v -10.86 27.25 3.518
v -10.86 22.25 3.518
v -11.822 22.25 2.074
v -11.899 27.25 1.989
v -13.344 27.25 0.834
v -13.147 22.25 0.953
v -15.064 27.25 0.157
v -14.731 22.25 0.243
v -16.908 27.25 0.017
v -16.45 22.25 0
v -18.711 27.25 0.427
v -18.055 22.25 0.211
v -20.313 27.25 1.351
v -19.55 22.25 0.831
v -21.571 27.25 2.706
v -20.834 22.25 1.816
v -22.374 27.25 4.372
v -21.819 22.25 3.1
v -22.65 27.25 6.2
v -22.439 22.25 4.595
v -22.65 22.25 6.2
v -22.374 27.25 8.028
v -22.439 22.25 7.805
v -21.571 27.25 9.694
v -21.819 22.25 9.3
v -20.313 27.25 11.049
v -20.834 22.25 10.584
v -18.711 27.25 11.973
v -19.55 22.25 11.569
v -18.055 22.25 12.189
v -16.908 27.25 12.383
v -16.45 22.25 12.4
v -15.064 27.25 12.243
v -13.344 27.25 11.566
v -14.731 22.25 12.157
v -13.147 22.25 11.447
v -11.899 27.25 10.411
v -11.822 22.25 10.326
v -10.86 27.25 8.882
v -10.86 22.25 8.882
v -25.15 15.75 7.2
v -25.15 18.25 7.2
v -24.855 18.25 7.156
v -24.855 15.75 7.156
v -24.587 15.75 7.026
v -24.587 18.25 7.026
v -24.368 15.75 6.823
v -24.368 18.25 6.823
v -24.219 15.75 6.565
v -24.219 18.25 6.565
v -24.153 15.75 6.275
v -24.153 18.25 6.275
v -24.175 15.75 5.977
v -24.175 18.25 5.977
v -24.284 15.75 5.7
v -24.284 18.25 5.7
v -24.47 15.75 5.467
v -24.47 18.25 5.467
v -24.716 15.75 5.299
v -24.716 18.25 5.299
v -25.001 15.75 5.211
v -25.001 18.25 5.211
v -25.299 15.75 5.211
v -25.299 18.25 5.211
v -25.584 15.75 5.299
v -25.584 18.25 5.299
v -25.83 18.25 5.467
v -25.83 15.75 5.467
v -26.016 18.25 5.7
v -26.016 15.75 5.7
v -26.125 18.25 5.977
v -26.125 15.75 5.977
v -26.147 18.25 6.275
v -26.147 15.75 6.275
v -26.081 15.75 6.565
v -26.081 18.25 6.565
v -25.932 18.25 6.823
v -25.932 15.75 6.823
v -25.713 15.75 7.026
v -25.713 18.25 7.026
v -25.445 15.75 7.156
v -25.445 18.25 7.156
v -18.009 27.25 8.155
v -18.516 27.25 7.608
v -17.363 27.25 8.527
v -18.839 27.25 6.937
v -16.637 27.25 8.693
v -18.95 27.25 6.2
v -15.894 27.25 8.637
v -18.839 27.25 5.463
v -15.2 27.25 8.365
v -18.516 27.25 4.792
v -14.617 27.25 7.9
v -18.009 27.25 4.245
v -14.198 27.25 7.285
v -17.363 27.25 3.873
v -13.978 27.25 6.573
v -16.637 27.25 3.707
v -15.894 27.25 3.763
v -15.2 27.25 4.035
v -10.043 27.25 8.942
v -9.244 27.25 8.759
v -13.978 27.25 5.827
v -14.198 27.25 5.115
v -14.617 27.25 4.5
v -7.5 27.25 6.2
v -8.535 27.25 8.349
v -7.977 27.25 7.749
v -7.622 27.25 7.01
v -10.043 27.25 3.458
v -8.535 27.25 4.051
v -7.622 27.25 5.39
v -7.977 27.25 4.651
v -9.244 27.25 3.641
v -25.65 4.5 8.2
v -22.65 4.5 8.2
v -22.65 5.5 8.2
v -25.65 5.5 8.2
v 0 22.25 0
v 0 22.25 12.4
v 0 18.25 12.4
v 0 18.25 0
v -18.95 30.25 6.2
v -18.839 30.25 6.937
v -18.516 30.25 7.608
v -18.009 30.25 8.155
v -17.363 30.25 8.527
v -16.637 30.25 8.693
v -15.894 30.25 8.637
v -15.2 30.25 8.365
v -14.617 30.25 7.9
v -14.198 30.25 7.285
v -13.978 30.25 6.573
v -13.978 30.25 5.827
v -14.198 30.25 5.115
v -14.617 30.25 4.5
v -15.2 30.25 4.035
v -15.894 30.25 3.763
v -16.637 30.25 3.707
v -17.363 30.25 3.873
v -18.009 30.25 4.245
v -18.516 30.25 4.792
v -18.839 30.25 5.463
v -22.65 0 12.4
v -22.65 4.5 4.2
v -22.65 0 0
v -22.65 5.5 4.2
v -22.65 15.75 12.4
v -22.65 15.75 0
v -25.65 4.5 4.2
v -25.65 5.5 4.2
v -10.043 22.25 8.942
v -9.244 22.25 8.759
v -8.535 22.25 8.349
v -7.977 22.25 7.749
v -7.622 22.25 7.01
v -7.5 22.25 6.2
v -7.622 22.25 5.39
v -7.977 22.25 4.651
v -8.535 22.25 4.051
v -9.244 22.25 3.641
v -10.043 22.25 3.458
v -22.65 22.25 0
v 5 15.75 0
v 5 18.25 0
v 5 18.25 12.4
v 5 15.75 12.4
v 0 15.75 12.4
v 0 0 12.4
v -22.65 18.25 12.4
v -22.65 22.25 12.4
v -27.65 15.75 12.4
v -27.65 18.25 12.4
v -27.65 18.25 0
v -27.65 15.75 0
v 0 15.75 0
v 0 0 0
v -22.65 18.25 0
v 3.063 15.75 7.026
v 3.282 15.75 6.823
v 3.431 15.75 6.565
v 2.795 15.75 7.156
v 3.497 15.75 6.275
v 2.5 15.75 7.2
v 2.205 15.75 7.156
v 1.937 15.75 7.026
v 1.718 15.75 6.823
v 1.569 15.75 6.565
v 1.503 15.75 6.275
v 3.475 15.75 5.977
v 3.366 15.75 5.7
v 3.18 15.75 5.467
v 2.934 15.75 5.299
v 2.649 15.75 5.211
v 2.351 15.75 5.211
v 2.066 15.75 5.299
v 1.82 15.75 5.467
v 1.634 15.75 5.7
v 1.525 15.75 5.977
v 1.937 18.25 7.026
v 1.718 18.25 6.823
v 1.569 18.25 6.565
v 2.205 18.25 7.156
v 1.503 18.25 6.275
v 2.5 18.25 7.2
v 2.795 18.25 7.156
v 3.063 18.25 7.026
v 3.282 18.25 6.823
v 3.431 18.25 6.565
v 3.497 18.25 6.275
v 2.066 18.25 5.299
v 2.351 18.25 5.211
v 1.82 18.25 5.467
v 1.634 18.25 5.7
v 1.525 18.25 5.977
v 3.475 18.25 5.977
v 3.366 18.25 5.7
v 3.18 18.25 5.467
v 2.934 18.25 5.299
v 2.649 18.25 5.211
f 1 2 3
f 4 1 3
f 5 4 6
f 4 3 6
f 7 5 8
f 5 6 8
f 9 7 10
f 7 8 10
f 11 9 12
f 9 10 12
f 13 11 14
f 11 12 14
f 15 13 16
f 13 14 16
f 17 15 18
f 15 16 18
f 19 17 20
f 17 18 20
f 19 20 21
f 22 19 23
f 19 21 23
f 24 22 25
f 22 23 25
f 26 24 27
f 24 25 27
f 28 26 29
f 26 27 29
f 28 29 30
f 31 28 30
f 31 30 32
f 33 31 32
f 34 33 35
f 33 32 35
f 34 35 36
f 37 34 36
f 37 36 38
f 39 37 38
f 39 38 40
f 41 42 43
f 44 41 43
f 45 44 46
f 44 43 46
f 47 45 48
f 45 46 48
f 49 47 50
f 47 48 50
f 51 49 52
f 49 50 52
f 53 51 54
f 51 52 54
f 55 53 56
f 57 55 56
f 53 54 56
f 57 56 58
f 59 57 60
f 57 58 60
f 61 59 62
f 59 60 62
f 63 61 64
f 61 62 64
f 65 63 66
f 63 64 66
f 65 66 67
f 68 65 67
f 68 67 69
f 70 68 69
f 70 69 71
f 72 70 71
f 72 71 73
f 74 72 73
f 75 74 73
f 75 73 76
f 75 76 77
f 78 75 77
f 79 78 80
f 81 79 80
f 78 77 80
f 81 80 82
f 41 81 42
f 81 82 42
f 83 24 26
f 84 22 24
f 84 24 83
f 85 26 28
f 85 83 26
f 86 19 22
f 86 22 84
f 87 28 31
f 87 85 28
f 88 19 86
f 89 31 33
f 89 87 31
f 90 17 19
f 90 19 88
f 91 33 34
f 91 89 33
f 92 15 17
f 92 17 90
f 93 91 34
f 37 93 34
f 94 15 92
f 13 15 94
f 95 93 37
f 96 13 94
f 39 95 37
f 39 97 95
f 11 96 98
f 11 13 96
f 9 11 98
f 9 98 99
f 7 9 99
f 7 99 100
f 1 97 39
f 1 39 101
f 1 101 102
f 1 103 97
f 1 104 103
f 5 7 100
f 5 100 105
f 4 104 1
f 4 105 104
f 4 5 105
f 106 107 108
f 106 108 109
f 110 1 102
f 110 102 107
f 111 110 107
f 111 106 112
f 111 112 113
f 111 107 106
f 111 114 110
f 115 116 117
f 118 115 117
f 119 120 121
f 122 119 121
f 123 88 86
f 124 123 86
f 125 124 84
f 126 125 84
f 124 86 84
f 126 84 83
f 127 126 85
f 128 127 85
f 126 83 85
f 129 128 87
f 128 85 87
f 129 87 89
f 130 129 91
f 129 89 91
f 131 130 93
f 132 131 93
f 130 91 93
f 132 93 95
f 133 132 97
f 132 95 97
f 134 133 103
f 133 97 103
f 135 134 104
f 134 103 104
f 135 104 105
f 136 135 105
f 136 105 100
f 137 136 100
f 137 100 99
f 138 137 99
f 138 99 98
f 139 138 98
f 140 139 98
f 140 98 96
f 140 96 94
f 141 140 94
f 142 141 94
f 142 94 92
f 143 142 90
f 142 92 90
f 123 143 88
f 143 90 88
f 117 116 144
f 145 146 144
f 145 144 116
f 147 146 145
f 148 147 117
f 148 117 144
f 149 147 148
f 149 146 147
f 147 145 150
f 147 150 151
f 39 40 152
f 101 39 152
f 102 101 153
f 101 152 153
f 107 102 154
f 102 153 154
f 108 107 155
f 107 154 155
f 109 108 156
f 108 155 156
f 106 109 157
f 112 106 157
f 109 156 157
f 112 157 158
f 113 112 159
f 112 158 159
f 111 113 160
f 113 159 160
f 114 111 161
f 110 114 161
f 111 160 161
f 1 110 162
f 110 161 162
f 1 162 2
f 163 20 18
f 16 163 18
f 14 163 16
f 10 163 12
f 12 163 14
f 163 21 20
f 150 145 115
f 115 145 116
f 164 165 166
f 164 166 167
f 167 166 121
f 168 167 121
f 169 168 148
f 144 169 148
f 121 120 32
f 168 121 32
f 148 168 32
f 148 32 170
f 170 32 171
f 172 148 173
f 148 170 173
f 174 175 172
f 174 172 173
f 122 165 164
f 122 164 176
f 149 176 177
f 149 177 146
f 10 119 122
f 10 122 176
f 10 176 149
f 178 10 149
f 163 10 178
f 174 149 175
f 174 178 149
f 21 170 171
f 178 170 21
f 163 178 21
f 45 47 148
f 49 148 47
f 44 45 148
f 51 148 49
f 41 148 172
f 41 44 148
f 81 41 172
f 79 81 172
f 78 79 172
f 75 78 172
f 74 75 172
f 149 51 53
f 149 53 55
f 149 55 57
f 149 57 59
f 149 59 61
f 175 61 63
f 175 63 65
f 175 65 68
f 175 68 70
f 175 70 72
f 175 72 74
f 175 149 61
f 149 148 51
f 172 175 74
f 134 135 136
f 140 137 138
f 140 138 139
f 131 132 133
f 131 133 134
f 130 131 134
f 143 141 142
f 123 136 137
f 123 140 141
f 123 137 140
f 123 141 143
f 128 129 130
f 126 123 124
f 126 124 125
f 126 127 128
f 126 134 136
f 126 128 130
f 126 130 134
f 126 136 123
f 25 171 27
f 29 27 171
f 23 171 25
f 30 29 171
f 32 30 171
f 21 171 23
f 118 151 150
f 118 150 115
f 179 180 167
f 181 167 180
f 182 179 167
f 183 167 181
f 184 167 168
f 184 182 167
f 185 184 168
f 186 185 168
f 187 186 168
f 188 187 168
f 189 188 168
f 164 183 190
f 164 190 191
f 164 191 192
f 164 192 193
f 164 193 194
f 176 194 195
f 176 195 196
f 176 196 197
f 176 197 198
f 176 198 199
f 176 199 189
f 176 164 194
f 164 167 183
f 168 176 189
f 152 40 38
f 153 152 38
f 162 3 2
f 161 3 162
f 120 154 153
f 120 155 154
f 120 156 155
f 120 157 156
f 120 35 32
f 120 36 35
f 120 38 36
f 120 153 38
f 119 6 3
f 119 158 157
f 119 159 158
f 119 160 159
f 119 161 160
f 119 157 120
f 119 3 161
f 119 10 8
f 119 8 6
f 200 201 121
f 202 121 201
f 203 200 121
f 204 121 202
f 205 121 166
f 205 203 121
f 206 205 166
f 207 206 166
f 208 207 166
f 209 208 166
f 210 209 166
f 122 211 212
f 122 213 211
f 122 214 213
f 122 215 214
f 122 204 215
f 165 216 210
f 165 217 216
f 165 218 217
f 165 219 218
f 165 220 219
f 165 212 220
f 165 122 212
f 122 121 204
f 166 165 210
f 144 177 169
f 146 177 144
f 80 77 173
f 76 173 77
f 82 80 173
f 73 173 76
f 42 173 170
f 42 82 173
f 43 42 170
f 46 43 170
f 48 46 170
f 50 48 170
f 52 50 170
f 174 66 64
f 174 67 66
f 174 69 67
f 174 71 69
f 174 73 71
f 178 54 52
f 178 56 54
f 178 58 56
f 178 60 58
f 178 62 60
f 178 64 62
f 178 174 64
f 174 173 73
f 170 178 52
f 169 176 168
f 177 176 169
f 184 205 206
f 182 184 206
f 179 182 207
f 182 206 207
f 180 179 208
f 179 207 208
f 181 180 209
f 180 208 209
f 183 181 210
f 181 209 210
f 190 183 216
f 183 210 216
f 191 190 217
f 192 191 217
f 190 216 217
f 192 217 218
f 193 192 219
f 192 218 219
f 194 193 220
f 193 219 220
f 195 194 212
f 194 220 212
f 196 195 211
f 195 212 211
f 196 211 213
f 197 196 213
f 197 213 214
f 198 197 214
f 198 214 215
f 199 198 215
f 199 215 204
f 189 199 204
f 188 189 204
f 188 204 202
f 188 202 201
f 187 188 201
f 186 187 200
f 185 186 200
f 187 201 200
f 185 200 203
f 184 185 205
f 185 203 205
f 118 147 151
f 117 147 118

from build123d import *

# Parameters (mm, degrees)
SALIENTE_EXTRUIR1_DEPTH = 12.4
SALIENTE_EXTRUIR2_DEPTH = 5
CROQUIS3_R              = 2.5
SALIENTE_EXTRUIR3_DEPTH = 3
CROQUIS4_W              = 4
CROQUIS4_H              = 1
SALIENTE_EXTRUIR4_DEPTH = 3
CROQUIS5_R              = 1
CORTAR_EXTRUIR1_DEPTH   = 2.5


with BuildPart() as part:
    # Croquis1 → Saliente-Extruir1 (new body)
    with BuildSketch(Plane.XY):
        Polygon((-22.65, 18.25), (-22.65, 22.25), (0, 22.25), (0, 18.25), (5, 18.25), (5, 15.75), (0, 15.75), (0, 0), (-22.65, 0), (-22.65, 15.75), (-27.65, 15.75), (-27.65, 18.25), align=None)
    extrude(amount=SALIENTE_EXTRUIR1_DEPTH)

    # Croquis2 → Saliente-Extruir2 (add)
    with BuildSketch(Plane(origin=(0, 22.25, 0), x_dir=(1, 0, 0), z_dir=(0, 1, 0))):
        with BuildLine():
            ThreePointArc((-10.859879032, -3.518480363), (-22.65, -6.2), (-10.859879032, -8.881519637))
            ThreePointArc((-10.859879032, -8.881519637), (-7.5, -6.2), (-10.859879032, -3.518480363))
        make_face()
    extrude(amount=SALIENTE_EXTRUIR2_DEPTH)

    # Croquis3 → Saliente-Extruir3 (add)
    with BuildSketch(Plane(origin=(0, 27.25, 0), x_dir=(1, 0, 0), z_dir=(0, 1, 0))):
        with Locations(Location((-16.45, -6.2, 0), (0, 0, 180))):
            Circle(CROQUIS3_R)
    extrude(amount=SALIENTE_EXTRUIR3_DEPTH)

    # Croquis4 → Saliente-Extruir4 (add)
    with BuildSketch(Plane.ZY.offset(22.65)):
        with Locations((6.2, 5)):
            Rectangle(CROQUIS4_W, CROQUIS4_H)
    extrude(amount=SALIENTE_EXTRUIR4_DEPTH)

    # Croquis5 → Cortar-Extruir1 (cut)
    with BuildSketch(Plane(origin=(0, 18.25, 0), x_dir=(1, 0, 0), z_dir=(0, 1, 0))):
        with Locations(Location((2.5, -6.2, 0), (0, 0, 270))):
            Circle(CROQUIS5_R)
        with Locations(Location((-25.15, -6.2, 0), (0, 0, 270))):
            Circle(CROQUIS5_R)
    extrude(amount=-CORTAR_EXTRUIR1_DEPTH, mode=Mode.SUBTRACT)


solid = part.part
